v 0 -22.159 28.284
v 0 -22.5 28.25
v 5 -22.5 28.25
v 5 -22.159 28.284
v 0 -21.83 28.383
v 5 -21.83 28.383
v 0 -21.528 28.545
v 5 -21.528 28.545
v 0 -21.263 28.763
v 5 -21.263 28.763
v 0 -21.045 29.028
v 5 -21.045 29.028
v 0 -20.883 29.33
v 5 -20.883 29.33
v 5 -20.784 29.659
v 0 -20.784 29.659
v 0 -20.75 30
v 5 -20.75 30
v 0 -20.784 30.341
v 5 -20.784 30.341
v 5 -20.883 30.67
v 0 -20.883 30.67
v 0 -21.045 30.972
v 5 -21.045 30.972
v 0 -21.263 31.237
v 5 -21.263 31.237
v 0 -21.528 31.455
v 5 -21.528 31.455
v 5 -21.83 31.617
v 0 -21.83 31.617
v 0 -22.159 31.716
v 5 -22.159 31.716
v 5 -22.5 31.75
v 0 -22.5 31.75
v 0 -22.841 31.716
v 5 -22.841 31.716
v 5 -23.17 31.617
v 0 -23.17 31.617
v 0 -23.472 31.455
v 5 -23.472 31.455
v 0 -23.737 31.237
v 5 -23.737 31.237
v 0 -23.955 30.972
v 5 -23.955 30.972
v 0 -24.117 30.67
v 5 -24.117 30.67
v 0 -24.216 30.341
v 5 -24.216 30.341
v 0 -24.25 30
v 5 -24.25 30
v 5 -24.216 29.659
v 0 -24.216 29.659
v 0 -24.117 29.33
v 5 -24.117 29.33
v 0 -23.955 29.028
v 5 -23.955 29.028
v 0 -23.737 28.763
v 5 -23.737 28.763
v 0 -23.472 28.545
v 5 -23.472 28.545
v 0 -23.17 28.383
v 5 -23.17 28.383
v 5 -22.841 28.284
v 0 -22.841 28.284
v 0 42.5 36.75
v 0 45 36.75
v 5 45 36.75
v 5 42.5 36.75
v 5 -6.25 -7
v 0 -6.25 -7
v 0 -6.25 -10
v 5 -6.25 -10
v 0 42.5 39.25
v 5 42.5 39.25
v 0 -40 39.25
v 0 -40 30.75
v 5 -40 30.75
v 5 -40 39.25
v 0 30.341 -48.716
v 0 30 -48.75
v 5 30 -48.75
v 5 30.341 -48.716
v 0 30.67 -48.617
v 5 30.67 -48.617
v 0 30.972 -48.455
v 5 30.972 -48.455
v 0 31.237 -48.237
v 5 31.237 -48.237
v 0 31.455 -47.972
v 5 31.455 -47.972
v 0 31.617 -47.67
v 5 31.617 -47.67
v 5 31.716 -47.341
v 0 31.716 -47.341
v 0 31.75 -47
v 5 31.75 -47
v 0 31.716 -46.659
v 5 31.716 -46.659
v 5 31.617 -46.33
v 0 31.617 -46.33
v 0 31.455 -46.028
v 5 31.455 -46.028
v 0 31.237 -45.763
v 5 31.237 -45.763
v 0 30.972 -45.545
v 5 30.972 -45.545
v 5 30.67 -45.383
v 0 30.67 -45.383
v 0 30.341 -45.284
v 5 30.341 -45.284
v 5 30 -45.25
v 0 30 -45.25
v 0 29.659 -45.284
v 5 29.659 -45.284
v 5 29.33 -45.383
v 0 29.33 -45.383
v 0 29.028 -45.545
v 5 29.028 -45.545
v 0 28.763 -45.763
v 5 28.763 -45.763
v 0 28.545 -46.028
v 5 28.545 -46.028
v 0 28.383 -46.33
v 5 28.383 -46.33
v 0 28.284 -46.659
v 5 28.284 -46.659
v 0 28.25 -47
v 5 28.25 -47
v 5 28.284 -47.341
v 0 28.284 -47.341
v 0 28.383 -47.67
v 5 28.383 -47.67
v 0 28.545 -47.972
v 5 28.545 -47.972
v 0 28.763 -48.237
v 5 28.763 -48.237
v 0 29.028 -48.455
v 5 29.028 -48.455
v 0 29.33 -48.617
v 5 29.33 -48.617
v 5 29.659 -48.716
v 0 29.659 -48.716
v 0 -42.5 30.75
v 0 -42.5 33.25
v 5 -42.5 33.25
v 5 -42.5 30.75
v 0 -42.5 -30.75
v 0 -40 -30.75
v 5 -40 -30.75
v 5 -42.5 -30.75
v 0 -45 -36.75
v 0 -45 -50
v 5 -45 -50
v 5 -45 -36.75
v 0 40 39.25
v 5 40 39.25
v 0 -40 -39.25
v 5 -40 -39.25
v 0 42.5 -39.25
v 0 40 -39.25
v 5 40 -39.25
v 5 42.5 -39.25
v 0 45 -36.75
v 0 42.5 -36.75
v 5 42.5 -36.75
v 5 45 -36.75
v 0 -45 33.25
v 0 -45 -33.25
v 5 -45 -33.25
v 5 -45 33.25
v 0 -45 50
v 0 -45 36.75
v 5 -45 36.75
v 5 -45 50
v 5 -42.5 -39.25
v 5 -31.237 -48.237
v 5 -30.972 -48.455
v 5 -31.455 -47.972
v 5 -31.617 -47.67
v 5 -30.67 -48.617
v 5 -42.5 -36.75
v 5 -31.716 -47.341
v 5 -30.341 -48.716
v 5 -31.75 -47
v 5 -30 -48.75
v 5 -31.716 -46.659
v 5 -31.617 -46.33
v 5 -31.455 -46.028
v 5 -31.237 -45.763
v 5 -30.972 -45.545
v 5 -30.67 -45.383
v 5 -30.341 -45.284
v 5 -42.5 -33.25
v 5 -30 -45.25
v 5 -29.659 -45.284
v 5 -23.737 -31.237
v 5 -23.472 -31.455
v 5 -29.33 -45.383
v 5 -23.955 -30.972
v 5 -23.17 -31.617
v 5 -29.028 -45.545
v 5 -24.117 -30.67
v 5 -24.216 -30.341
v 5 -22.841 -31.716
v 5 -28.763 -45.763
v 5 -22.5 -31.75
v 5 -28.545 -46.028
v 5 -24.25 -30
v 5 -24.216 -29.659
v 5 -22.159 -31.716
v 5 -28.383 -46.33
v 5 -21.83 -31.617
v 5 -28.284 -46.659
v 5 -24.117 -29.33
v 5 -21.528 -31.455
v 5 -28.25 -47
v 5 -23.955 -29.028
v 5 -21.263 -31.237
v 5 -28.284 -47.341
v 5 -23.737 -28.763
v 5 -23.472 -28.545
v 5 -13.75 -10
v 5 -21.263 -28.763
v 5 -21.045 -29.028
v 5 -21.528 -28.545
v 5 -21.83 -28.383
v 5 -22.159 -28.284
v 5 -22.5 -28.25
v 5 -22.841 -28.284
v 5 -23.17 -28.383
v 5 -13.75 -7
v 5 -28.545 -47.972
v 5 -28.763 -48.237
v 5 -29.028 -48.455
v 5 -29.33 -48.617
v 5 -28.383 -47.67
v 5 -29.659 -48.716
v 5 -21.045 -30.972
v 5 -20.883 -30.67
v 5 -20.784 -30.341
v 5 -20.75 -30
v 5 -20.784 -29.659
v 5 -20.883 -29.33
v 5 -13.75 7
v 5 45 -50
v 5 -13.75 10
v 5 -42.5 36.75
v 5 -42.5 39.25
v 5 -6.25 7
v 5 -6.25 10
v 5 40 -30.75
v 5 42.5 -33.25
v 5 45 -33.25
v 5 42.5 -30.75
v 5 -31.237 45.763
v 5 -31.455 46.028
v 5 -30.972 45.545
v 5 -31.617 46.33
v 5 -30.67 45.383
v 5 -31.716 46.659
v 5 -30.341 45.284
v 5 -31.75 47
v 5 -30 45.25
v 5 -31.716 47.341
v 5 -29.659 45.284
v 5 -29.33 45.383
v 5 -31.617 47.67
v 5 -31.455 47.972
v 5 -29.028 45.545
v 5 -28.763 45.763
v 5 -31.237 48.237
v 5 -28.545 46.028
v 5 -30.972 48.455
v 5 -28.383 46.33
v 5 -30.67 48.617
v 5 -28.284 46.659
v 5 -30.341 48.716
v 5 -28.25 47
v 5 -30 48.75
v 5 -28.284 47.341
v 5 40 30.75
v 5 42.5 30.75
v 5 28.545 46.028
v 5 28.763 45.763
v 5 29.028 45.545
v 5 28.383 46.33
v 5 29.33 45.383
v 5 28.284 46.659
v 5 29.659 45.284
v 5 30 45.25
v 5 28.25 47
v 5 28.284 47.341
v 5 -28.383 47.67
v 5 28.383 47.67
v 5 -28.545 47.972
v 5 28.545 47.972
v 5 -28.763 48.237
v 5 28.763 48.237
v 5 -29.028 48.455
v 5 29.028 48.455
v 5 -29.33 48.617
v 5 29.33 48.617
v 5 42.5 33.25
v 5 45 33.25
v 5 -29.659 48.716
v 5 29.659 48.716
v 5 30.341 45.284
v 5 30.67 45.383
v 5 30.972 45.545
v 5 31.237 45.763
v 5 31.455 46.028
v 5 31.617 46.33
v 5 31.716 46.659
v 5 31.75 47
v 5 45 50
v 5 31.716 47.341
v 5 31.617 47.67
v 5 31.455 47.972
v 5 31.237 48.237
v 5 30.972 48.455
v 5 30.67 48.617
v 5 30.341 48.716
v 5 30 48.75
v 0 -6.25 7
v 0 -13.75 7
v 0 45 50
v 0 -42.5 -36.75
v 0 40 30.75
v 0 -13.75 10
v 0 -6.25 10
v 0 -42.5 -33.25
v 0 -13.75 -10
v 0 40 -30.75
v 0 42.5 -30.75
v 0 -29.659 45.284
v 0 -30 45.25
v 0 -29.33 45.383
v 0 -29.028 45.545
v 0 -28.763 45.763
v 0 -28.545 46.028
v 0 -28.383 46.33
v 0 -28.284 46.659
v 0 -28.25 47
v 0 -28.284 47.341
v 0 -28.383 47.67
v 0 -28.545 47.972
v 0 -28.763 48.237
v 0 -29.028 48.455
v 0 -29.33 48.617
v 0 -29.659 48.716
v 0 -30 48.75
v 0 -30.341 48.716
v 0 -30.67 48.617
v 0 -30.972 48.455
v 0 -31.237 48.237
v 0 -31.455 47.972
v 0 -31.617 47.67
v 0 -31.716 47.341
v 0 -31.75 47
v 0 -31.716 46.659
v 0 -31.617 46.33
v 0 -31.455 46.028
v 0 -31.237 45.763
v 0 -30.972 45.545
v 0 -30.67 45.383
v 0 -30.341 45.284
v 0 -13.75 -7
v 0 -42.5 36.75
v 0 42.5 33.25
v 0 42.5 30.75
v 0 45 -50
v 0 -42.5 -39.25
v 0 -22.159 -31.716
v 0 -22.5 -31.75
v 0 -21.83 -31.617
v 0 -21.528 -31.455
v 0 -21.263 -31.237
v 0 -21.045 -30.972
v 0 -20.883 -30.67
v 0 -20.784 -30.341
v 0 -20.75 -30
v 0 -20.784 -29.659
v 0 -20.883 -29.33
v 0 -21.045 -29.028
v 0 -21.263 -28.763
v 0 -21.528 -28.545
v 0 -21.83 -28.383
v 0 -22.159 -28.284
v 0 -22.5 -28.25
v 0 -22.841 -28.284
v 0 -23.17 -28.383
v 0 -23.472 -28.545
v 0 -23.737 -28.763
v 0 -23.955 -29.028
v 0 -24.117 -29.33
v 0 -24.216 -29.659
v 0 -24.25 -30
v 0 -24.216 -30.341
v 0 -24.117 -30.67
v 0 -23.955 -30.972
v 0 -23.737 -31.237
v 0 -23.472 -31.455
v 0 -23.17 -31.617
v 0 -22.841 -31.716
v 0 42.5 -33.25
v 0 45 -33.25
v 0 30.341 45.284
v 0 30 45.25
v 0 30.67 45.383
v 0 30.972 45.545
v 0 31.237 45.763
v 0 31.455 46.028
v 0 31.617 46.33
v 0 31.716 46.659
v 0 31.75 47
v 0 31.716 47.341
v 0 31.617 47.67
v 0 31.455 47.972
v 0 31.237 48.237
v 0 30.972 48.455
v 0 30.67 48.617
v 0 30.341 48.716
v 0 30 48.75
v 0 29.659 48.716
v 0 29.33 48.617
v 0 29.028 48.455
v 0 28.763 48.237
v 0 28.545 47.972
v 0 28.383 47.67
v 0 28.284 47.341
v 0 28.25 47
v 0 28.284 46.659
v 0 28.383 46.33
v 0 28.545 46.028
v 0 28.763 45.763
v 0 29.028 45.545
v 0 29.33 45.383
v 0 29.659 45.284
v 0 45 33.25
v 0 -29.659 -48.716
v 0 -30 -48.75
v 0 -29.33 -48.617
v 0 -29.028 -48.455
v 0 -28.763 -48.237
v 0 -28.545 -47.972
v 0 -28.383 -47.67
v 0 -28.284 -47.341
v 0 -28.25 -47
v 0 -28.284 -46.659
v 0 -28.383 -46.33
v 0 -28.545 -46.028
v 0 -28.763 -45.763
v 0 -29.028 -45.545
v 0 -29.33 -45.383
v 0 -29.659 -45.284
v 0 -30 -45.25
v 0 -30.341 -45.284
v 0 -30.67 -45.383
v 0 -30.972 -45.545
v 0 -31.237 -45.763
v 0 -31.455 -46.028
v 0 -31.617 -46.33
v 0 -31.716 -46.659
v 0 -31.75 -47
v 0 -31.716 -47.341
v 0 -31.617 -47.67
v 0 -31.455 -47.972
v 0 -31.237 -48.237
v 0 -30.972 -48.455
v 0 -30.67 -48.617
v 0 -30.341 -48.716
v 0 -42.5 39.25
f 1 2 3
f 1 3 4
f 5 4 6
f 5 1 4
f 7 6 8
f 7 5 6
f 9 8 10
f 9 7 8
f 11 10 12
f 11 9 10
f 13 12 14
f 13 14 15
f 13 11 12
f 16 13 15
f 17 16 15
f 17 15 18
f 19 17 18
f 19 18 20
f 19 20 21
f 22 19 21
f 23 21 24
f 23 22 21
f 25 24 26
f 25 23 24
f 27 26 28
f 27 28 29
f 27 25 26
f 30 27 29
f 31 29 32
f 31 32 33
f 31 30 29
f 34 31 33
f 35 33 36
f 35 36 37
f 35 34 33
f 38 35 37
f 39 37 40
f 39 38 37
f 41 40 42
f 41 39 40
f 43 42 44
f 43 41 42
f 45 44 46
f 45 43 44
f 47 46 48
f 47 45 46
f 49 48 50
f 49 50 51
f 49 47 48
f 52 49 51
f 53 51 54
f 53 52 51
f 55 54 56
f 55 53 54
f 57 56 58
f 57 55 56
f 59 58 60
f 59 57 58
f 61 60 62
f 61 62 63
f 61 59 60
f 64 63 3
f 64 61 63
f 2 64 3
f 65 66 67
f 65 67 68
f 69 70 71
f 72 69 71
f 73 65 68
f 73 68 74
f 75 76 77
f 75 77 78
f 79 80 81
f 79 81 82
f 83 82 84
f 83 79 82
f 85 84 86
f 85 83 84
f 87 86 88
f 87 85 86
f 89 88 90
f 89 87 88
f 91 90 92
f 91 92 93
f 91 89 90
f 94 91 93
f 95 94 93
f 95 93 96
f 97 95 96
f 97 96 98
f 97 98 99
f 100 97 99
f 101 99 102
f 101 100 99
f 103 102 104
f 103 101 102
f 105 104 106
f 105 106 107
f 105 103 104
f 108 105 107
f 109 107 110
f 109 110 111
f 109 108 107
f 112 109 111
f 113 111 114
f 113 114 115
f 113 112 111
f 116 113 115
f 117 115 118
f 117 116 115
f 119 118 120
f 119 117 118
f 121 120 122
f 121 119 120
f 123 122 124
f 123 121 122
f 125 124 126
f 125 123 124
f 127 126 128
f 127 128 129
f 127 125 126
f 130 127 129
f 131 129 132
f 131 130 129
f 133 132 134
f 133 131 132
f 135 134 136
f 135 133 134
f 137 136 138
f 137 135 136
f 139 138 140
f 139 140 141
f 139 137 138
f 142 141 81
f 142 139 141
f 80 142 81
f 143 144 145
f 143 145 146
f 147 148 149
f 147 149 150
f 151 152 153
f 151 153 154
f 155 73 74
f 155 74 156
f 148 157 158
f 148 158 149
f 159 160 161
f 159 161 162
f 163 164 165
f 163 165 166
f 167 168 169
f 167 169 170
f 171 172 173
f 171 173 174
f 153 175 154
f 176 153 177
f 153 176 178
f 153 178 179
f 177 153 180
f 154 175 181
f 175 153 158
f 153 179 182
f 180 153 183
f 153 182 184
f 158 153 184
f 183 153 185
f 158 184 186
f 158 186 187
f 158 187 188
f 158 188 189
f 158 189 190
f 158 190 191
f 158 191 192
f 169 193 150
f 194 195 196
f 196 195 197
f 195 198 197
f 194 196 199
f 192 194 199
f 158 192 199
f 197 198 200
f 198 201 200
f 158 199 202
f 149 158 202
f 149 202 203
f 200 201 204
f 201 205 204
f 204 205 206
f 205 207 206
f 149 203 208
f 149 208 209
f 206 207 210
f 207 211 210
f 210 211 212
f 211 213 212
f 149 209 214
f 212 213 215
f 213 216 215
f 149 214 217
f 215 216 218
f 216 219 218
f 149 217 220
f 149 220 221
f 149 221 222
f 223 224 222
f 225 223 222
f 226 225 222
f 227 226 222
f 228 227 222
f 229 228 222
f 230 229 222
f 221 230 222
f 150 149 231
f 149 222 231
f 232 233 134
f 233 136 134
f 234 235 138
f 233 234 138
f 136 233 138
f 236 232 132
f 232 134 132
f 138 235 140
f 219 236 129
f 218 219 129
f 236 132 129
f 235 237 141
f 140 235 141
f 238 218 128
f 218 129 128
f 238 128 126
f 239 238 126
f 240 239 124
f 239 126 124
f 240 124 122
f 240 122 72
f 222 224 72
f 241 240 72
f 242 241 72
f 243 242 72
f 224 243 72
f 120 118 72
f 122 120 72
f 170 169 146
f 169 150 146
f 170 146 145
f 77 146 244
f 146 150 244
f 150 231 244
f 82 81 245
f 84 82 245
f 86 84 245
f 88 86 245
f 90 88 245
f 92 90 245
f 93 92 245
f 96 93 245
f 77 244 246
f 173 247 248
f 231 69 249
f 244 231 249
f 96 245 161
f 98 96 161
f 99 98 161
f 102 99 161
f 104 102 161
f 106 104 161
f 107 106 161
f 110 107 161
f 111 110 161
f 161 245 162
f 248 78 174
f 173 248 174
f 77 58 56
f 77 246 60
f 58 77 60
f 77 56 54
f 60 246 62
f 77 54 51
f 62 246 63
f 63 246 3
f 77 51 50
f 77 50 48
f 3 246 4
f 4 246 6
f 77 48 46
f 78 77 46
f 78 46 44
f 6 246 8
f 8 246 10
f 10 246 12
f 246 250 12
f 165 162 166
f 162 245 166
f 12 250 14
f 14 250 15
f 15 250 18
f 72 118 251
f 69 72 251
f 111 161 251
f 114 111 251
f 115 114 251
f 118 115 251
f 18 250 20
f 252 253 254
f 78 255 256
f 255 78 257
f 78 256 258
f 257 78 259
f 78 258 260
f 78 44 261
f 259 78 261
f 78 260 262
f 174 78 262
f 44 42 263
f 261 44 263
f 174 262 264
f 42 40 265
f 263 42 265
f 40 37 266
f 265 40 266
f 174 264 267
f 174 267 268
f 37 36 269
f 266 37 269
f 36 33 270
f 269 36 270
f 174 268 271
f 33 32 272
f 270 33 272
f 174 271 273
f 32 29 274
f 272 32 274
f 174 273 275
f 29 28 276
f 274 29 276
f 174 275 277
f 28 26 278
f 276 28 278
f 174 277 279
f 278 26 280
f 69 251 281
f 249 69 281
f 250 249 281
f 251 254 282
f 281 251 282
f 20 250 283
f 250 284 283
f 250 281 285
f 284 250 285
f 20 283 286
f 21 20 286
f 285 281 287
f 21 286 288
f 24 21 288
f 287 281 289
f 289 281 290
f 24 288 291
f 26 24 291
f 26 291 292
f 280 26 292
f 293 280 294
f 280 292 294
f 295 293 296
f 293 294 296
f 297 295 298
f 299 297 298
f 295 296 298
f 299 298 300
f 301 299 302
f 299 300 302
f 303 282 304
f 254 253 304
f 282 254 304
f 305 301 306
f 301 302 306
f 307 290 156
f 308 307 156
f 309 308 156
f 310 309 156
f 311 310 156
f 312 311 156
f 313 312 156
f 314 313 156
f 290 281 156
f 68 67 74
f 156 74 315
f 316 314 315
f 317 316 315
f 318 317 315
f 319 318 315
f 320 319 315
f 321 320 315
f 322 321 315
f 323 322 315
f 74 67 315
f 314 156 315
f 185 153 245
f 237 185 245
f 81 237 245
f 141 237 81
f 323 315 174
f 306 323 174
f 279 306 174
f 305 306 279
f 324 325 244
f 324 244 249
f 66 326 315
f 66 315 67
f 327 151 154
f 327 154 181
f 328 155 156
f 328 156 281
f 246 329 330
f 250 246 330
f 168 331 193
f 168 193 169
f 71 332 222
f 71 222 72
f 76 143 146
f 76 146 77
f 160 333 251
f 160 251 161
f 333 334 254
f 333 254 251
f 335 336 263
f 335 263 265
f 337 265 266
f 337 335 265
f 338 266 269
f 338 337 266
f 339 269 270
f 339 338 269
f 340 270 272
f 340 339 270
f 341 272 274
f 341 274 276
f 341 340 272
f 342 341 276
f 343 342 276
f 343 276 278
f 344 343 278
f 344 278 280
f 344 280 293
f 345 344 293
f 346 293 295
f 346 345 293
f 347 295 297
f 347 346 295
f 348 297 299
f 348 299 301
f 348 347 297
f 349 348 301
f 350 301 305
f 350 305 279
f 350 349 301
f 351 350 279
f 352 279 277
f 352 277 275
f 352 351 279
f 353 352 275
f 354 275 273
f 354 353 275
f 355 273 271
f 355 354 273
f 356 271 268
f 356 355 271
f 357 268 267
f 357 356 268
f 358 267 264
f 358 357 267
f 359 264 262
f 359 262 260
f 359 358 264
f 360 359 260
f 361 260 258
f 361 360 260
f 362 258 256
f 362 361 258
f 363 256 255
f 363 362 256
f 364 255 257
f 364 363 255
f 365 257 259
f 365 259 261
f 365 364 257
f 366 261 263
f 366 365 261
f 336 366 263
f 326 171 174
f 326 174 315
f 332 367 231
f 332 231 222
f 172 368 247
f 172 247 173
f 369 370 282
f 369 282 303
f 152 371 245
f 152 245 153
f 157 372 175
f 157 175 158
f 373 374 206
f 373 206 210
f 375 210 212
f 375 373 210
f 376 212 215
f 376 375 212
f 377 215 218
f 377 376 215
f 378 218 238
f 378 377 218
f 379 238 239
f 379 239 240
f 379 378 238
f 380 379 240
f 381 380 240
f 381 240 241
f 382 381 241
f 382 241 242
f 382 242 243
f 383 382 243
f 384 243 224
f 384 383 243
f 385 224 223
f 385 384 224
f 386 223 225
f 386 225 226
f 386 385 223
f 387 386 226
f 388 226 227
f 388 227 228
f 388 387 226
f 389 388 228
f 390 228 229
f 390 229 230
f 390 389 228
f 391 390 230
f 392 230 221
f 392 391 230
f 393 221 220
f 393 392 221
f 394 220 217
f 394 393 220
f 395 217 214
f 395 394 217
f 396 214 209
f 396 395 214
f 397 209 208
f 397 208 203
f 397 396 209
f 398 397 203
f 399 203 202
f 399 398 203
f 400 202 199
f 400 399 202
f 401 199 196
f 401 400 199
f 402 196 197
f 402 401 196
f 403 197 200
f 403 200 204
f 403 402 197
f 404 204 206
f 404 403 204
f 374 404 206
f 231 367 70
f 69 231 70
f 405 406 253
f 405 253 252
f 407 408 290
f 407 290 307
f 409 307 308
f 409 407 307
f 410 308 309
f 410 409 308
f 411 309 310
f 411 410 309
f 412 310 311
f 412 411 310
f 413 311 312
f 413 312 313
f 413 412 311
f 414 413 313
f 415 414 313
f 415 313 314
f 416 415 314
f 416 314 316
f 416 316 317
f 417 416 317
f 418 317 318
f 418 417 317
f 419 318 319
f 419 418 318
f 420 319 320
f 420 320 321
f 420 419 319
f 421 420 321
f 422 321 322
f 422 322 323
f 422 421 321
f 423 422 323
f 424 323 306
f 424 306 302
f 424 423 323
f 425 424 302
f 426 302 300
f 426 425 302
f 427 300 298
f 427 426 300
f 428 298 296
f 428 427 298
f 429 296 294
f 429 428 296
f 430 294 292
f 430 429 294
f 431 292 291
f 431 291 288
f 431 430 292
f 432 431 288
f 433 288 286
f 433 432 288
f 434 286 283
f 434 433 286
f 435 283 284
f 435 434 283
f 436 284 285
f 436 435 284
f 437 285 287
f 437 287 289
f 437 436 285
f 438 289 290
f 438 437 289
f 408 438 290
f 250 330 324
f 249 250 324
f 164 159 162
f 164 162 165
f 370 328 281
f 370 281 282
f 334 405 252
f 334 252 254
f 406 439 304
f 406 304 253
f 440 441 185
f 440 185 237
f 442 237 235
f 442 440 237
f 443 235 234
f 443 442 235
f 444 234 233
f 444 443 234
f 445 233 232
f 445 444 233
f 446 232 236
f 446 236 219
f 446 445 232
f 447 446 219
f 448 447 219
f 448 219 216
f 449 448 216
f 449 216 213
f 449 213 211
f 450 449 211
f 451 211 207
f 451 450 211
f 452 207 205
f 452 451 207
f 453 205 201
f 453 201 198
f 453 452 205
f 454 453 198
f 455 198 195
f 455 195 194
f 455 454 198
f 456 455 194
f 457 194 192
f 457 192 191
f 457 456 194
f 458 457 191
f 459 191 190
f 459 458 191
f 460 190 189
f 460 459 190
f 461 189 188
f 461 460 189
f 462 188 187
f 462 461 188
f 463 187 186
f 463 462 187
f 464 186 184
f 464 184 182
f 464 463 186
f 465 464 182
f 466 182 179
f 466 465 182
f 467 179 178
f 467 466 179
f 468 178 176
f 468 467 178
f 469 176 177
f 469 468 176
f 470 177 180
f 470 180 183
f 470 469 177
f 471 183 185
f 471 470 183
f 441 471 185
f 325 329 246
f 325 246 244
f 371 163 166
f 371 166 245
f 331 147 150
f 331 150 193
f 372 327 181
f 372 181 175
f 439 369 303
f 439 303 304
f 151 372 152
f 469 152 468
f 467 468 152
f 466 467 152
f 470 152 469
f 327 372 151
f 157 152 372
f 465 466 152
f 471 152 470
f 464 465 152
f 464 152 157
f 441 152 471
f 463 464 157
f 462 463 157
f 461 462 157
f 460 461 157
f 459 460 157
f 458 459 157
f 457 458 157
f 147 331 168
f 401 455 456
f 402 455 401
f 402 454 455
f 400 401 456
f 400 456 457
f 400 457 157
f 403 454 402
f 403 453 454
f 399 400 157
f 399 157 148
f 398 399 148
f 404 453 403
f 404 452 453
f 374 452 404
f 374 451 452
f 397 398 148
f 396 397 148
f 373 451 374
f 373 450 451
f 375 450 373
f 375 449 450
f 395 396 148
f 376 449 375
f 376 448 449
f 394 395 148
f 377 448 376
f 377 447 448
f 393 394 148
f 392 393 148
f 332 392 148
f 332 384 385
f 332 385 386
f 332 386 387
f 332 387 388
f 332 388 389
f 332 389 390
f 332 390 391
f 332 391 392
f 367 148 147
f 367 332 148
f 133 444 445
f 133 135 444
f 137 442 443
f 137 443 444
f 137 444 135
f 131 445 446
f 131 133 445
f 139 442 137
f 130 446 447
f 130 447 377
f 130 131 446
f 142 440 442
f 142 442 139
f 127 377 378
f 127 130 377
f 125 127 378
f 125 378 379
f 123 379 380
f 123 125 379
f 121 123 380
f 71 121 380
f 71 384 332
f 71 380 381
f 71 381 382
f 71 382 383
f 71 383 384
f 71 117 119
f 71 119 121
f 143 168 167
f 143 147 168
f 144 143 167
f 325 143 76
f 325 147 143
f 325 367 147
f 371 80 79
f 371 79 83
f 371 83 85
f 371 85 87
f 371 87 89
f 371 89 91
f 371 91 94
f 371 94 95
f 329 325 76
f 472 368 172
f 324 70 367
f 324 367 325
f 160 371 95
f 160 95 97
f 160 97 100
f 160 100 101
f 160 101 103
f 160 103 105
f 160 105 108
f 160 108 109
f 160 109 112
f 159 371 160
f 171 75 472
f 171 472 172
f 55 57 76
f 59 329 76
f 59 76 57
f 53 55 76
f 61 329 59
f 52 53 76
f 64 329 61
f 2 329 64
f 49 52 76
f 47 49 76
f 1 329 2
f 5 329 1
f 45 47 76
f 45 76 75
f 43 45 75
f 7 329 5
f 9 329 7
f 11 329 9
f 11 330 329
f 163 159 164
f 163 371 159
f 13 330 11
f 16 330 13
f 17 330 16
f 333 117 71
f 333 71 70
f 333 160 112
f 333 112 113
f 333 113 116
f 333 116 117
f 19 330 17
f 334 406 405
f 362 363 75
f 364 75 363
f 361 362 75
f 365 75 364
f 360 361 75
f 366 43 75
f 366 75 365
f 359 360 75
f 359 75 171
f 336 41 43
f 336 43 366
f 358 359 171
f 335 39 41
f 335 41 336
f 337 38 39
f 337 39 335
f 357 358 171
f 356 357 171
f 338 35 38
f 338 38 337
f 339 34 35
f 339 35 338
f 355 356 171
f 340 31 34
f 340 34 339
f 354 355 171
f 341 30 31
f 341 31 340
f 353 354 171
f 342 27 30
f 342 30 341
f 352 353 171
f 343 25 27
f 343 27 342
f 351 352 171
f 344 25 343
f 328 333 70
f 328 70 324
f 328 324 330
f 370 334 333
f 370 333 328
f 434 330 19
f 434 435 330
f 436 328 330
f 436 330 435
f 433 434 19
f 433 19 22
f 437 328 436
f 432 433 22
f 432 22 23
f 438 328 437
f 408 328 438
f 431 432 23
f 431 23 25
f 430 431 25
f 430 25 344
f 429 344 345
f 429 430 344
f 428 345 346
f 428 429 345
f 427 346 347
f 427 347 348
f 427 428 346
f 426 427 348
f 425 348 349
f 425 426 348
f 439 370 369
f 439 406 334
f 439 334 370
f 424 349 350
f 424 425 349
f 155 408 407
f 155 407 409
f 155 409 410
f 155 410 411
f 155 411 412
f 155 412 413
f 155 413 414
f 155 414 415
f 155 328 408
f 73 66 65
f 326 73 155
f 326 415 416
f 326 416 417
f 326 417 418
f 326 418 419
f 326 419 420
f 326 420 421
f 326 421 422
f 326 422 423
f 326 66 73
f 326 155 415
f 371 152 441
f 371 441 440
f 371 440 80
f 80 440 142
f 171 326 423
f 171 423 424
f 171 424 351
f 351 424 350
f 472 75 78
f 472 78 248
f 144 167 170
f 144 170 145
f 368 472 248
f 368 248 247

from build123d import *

# Parameters (mm, degrees)
SKETCH_1_R      = 1.75
SKETCH_1_W      = 3
SKETCH_1_H      = 7.5
EXTRUDE_1_DEPTH = 5


with BuildPart() as part:
    # Эскиз1 → Бобышка-Вытянуть1 (new body)
    with BuildSketch(Plane(origin=(0, 0, 0), x_dir=(0, 0, -1), z_dir=(1, 0, 0))):
        Polygon((-36.75, 45), (-36.75, 42.5), (-39.25, 42.5), (-39.25, 40), (-30.75, 40), (-30.75, 42.5), (-33.25, 42.5), (-33.25, 45), (33.25, 45), (33.25, 42.5), (30.75, 42.5), (30.75, 40), (39.25, 40), (39.25, 42.5), (36.75, 42.5), (36.75, 45), (50, 45), (50, -45), (36.75, -45), (36.75, -42.5), (39.25, -42.5), (39.25, -40), (30.75, -40), (30.75, -42.5), (33.25, -42.5), (33.25, -45), (-33.25, -45), (-33.25, -42.5), (-30.75, -42.5), (-30.75, -40), (-39.25, -40), (-39.25, -42.5), (-36.75, -42.5), (-36.75, -45), (-50, -45), (-50, 45), align=None)
        with Locations((-47, 30)):
            Circle(SKETCH_1_R, mode=Mode.SUBTRACT)
        with Locations((47, 30)):
            Circle(SKETCH_1_R, mode=Mode.SUBTRACT)
        with Locations((47, -30)):
            Circle(SKETCH_1_R, mode=Mode.SUBTRACT)
        with Locations((-47, -30)):
            Circle(SKETCH_1_R, mode=Mode.SUBTRACT)
        with Locations((-30, -22.5)):
            Circle(SKETCH_1_R, mode=Mode.SUBTRACT)
        with Locations((30, -22.5)):
            Circle(SKETCH_1_R, mode=Mode.SUBTRACT)
        with Locations((8.5, -10)):
            Rectangle(SKETCH_1_W, SKETCH_1_H, mode=Mode.SUBTRACT)
        with Locations((-8.5, -10)):
            Rectangle(SKETCH_1_W, SKETCH_1_H, mode=Mode.SUBTRACT)
    extrude(amount=EXTRUDE_1_DEPTH)


solid = part.part
